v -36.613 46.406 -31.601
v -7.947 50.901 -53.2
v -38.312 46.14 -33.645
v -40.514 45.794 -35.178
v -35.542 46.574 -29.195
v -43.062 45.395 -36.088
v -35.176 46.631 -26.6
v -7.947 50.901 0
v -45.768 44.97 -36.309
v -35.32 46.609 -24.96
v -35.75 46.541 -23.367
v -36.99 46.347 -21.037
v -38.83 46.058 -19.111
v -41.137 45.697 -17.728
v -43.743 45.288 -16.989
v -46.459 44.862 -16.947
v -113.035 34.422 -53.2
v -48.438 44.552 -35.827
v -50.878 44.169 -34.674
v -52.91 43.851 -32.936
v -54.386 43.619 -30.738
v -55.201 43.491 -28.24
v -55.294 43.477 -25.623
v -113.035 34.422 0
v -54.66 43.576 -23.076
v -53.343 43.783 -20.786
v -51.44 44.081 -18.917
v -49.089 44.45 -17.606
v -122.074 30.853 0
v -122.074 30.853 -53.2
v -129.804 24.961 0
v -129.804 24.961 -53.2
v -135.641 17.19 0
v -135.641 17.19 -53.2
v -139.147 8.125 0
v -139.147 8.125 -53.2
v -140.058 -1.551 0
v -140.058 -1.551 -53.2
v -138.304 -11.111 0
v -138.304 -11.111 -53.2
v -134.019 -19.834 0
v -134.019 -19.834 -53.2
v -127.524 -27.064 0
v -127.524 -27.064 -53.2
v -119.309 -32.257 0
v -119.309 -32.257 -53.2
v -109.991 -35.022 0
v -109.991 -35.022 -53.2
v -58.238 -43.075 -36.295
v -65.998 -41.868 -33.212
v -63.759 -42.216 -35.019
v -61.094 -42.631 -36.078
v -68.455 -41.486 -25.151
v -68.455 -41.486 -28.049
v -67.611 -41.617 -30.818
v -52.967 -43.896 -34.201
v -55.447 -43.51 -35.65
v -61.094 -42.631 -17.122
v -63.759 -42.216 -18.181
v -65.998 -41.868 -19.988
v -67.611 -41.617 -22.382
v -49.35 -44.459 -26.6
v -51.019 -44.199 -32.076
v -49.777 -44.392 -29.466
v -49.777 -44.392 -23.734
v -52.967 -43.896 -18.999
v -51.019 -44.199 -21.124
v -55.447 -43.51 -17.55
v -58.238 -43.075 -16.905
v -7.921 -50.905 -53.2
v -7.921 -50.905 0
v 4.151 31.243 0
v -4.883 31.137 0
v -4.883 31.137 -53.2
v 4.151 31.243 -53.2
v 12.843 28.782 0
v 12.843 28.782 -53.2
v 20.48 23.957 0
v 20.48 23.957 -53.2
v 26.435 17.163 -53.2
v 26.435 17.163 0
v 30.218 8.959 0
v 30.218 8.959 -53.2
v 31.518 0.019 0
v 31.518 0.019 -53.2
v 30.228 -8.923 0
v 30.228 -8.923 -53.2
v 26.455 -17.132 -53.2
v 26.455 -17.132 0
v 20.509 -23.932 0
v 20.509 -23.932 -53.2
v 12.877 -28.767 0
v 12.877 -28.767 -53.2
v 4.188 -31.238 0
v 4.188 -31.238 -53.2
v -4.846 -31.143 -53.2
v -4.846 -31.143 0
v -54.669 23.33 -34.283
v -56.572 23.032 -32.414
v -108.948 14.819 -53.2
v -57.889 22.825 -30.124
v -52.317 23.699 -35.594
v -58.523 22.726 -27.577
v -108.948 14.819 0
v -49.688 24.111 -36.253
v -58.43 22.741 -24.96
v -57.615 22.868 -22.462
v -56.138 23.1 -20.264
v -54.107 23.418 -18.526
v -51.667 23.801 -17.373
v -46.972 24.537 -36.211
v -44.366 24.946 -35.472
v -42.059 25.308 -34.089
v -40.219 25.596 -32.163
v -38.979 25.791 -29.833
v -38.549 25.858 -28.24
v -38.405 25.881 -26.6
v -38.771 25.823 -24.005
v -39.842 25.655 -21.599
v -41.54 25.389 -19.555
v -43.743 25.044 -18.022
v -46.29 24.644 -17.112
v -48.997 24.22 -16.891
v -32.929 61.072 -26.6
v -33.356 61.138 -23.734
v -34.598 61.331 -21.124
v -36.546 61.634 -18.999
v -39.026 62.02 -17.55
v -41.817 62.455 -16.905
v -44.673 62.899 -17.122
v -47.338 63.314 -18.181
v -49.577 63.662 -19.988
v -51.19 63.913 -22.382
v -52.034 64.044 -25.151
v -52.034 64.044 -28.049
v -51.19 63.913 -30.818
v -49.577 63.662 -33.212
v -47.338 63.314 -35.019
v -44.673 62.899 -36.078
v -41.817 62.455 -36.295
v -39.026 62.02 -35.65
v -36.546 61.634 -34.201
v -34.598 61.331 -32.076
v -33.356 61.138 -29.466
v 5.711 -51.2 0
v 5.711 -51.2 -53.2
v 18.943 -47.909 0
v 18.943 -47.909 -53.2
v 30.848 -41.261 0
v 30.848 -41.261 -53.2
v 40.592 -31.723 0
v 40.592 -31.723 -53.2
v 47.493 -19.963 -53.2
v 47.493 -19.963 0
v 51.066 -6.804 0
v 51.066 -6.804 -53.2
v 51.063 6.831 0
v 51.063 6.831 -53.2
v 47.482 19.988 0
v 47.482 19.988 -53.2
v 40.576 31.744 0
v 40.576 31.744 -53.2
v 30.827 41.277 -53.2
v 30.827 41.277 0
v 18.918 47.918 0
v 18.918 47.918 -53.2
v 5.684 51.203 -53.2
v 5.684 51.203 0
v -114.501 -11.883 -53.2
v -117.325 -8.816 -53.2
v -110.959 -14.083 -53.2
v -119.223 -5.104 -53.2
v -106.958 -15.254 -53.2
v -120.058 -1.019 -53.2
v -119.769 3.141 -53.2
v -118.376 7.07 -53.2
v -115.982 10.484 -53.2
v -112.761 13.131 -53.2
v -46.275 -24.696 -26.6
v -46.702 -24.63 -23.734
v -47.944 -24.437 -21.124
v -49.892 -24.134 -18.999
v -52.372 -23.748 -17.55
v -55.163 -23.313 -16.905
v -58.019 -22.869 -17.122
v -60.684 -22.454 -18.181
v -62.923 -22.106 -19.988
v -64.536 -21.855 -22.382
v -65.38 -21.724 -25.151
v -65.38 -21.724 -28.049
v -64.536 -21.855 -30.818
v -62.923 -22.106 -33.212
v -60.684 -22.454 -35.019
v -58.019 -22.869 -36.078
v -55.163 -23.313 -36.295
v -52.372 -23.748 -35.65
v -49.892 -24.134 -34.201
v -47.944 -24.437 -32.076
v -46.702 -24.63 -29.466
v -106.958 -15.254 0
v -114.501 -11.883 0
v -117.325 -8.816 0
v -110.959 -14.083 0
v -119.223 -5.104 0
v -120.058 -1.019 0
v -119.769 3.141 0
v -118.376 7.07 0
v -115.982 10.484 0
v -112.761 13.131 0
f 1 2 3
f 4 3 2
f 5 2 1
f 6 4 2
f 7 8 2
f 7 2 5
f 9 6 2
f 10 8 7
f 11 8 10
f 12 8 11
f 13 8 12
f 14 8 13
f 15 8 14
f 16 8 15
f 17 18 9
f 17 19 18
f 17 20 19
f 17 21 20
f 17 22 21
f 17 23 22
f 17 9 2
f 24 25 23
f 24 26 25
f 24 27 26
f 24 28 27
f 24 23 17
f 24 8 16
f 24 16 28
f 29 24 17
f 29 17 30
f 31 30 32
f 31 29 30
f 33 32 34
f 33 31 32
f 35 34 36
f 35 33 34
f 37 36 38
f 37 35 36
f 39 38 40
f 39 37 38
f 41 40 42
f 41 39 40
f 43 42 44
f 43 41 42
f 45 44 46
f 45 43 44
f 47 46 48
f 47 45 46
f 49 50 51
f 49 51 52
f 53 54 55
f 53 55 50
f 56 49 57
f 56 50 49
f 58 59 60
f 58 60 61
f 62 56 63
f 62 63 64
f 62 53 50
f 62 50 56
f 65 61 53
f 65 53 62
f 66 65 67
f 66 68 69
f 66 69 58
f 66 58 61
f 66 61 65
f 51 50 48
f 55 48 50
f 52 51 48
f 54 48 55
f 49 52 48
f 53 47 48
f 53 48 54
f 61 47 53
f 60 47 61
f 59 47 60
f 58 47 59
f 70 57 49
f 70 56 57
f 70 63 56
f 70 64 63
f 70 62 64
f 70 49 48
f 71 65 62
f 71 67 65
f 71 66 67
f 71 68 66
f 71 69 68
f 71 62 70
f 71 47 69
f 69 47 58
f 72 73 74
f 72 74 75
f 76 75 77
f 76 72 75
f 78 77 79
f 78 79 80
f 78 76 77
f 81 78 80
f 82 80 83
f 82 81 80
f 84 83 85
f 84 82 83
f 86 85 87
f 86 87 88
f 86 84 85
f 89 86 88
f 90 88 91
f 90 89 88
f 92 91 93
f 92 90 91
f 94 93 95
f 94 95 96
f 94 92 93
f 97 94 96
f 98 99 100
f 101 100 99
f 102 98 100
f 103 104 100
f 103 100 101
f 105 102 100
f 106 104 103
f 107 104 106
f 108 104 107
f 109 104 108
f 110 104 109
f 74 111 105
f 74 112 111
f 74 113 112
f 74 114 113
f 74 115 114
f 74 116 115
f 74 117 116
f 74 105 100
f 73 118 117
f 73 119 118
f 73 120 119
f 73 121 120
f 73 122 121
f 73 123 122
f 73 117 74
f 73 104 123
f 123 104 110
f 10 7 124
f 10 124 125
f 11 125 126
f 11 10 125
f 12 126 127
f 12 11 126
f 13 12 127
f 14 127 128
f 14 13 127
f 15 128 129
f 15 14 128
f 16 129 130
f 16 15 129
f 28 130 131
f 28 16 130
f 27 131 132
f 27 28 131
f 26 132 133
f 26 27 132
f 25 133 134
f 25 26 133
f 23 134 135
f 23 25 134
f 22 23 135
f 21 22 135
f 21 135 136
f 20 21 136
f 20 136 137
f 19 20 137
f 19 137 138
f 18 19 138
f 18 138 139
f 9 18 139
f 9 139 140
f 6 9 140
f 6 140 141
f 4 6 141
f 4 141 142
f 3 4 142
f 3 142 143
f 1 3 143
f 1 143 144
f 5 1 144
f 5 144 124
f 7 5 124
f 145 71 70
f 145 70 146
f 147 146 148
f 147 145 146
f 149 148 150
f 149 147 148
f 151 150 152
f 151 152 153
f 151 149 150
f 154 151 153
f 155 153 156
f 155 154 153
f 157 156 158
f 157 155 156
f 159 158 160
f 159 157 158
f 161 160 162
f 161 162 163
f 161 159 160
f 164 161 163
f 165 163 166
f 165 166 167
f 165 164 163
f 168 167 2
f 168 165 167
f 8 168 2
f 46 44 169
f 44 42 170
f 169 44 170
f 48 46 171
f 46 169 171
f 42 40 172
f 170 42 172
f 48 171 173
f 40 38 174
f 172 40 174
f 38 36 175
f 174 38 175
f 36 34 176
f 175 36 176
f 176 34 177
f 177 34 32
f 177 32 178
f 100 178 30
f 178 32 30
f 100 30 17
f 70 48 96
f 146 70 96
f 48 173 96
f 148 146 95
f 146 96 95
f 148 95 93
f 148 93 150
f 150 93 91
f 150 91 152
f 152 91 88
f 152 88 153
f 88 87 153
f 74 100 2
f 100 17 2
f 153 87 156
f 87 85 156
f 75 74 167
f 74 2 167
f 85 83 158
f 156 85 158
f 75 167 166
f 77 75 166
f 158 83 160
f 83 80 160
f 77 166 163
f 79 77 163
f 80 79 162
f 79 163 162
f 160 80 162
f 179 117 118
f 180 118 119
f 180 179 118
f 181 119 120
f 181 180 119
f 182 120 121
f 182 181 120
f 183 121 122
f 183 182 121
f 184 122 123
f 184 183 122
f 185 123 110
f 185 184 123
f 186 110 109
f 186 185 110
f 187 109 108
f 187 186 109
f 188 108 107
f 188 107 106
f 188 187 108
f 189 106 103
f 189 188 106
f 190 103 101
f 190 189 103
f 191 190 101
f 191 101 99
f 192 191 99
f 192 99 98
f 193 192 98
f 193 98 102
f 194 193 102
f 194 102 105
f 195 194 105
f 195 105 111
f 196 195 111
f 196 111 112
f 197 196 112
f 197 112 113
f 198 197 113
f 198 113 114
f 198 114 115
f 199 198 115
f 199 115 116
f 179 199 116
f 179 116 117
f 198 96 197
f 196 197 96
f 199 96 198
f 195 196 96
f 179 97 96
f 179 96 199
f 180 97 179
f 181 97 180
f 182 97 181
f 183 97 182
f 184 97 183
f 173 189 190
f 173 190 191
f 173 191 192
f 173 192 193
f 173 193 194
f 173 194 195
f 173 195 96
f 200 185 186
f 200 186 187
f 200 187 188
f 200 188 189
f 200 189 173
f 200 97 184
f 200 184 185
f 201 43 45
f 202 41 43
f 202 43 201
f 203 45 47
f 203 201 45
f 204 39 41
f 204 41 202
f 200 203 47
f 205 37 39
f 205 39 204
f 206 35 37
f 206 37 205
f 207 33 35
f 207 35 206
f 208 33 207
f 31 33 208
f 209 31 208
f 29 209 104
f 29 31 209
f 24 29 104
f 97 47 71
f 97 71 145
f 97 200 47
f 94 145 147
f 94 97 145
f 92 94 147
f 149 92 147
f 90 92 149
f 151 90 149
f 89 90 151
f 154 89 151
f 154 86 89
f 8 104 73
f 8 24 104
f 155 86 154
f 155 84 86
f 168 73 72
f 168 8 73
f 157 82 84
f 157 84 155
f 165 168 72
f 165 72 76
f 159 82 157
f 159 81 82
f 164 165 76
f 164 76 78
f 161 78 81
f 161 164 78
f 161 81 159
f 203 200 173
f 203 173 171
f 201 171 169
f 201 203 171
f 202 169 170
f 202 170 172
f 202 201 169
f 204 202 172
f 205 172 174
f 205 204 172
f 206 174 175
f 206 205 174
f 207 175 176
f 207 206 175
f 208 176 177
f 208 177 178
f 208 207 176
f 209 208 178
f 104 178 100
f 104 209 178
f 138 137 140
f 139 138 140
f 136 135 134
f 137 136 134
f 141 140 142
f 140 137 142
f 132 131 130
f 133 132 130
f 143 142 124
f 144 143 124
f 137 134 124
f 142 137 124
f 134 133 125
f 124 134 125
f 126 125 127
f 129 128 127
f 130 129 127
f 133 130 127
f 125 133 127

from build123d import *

# Parameters (mm, degrees)
F1_DEPTH = 53.2
F2_R     = 9.7217056973
F3_DEPTH = 106.8
F4_DEPTH = 33.4


# Not quite as in the source:
# - ends of sketch curves that miss each other by under 0.0002 mm in the source are joined


with BuildPart() as f1:
    # F0 (on Top) → F1 (new body)
    with BuildSketch(Plane.XY):
        with BuildLine():
            Line((-7.9474923426, 50.9009919427), (-113.0345375872, 34.4224307572))
            ThreePointArc((-113.0345375872, 34.4224307572), (-140.0579018259, -1.5509775623), (-109.9911685167, -35.0224560031))
            Line((-109.9911685167, -35.0224560031), (-7.9210999462, -50.905094516))
            ThreePointArc((-7.9210999462, -50.905094516), (51.5176891338, 0.0133546718), (-7.9474923426, 50.9009919427))
        make_face()
        with BuildLine():
            ThreePointArc((-4.8825833147, 31.1371999002), (31.5176854276, 0.01851299), (-4.8460009605, -31.1429143167))
            Line((-4.8460009605, -31.1429143167), (-106.957762942, -15.2537880902))
            ThreePointArc((-106.957762942, -15.2537880902), (-120.0581940893, -1.0187143376), (-108.9482164871, 14.8188049967))
            Line((-108.9482164871, 14.8188049967), (-4.8825833147, 31.1371999002))
        make_face(mode=Mode.SUBTRACT)
    extrude(amount=-F1_DEPTH)

    # F2 (on face) → F3 (join)
    with BuildSketch(Plane(origin=(-7.9210999462, -50.905094516, 0), x_dir=(0.98810901, -0.1537549493, 0), z_dir=(-0.1537549493, -0.98810901, 0))):
        with Locations((-51.6491943406, -26.6)):
            Circle(F2_R)
    extrude(amount=-F3_DEPTH)

    # F4 (add): a face of the model
    f4_faces = [f1.faces().sort_by_distance(p)[0] for p in [
        (-42.5351056478, 62.5662670045, -26.6),
    ]]
    extrude(f4_faces, amount=-F4_DEPTH)


solid = f1.part
